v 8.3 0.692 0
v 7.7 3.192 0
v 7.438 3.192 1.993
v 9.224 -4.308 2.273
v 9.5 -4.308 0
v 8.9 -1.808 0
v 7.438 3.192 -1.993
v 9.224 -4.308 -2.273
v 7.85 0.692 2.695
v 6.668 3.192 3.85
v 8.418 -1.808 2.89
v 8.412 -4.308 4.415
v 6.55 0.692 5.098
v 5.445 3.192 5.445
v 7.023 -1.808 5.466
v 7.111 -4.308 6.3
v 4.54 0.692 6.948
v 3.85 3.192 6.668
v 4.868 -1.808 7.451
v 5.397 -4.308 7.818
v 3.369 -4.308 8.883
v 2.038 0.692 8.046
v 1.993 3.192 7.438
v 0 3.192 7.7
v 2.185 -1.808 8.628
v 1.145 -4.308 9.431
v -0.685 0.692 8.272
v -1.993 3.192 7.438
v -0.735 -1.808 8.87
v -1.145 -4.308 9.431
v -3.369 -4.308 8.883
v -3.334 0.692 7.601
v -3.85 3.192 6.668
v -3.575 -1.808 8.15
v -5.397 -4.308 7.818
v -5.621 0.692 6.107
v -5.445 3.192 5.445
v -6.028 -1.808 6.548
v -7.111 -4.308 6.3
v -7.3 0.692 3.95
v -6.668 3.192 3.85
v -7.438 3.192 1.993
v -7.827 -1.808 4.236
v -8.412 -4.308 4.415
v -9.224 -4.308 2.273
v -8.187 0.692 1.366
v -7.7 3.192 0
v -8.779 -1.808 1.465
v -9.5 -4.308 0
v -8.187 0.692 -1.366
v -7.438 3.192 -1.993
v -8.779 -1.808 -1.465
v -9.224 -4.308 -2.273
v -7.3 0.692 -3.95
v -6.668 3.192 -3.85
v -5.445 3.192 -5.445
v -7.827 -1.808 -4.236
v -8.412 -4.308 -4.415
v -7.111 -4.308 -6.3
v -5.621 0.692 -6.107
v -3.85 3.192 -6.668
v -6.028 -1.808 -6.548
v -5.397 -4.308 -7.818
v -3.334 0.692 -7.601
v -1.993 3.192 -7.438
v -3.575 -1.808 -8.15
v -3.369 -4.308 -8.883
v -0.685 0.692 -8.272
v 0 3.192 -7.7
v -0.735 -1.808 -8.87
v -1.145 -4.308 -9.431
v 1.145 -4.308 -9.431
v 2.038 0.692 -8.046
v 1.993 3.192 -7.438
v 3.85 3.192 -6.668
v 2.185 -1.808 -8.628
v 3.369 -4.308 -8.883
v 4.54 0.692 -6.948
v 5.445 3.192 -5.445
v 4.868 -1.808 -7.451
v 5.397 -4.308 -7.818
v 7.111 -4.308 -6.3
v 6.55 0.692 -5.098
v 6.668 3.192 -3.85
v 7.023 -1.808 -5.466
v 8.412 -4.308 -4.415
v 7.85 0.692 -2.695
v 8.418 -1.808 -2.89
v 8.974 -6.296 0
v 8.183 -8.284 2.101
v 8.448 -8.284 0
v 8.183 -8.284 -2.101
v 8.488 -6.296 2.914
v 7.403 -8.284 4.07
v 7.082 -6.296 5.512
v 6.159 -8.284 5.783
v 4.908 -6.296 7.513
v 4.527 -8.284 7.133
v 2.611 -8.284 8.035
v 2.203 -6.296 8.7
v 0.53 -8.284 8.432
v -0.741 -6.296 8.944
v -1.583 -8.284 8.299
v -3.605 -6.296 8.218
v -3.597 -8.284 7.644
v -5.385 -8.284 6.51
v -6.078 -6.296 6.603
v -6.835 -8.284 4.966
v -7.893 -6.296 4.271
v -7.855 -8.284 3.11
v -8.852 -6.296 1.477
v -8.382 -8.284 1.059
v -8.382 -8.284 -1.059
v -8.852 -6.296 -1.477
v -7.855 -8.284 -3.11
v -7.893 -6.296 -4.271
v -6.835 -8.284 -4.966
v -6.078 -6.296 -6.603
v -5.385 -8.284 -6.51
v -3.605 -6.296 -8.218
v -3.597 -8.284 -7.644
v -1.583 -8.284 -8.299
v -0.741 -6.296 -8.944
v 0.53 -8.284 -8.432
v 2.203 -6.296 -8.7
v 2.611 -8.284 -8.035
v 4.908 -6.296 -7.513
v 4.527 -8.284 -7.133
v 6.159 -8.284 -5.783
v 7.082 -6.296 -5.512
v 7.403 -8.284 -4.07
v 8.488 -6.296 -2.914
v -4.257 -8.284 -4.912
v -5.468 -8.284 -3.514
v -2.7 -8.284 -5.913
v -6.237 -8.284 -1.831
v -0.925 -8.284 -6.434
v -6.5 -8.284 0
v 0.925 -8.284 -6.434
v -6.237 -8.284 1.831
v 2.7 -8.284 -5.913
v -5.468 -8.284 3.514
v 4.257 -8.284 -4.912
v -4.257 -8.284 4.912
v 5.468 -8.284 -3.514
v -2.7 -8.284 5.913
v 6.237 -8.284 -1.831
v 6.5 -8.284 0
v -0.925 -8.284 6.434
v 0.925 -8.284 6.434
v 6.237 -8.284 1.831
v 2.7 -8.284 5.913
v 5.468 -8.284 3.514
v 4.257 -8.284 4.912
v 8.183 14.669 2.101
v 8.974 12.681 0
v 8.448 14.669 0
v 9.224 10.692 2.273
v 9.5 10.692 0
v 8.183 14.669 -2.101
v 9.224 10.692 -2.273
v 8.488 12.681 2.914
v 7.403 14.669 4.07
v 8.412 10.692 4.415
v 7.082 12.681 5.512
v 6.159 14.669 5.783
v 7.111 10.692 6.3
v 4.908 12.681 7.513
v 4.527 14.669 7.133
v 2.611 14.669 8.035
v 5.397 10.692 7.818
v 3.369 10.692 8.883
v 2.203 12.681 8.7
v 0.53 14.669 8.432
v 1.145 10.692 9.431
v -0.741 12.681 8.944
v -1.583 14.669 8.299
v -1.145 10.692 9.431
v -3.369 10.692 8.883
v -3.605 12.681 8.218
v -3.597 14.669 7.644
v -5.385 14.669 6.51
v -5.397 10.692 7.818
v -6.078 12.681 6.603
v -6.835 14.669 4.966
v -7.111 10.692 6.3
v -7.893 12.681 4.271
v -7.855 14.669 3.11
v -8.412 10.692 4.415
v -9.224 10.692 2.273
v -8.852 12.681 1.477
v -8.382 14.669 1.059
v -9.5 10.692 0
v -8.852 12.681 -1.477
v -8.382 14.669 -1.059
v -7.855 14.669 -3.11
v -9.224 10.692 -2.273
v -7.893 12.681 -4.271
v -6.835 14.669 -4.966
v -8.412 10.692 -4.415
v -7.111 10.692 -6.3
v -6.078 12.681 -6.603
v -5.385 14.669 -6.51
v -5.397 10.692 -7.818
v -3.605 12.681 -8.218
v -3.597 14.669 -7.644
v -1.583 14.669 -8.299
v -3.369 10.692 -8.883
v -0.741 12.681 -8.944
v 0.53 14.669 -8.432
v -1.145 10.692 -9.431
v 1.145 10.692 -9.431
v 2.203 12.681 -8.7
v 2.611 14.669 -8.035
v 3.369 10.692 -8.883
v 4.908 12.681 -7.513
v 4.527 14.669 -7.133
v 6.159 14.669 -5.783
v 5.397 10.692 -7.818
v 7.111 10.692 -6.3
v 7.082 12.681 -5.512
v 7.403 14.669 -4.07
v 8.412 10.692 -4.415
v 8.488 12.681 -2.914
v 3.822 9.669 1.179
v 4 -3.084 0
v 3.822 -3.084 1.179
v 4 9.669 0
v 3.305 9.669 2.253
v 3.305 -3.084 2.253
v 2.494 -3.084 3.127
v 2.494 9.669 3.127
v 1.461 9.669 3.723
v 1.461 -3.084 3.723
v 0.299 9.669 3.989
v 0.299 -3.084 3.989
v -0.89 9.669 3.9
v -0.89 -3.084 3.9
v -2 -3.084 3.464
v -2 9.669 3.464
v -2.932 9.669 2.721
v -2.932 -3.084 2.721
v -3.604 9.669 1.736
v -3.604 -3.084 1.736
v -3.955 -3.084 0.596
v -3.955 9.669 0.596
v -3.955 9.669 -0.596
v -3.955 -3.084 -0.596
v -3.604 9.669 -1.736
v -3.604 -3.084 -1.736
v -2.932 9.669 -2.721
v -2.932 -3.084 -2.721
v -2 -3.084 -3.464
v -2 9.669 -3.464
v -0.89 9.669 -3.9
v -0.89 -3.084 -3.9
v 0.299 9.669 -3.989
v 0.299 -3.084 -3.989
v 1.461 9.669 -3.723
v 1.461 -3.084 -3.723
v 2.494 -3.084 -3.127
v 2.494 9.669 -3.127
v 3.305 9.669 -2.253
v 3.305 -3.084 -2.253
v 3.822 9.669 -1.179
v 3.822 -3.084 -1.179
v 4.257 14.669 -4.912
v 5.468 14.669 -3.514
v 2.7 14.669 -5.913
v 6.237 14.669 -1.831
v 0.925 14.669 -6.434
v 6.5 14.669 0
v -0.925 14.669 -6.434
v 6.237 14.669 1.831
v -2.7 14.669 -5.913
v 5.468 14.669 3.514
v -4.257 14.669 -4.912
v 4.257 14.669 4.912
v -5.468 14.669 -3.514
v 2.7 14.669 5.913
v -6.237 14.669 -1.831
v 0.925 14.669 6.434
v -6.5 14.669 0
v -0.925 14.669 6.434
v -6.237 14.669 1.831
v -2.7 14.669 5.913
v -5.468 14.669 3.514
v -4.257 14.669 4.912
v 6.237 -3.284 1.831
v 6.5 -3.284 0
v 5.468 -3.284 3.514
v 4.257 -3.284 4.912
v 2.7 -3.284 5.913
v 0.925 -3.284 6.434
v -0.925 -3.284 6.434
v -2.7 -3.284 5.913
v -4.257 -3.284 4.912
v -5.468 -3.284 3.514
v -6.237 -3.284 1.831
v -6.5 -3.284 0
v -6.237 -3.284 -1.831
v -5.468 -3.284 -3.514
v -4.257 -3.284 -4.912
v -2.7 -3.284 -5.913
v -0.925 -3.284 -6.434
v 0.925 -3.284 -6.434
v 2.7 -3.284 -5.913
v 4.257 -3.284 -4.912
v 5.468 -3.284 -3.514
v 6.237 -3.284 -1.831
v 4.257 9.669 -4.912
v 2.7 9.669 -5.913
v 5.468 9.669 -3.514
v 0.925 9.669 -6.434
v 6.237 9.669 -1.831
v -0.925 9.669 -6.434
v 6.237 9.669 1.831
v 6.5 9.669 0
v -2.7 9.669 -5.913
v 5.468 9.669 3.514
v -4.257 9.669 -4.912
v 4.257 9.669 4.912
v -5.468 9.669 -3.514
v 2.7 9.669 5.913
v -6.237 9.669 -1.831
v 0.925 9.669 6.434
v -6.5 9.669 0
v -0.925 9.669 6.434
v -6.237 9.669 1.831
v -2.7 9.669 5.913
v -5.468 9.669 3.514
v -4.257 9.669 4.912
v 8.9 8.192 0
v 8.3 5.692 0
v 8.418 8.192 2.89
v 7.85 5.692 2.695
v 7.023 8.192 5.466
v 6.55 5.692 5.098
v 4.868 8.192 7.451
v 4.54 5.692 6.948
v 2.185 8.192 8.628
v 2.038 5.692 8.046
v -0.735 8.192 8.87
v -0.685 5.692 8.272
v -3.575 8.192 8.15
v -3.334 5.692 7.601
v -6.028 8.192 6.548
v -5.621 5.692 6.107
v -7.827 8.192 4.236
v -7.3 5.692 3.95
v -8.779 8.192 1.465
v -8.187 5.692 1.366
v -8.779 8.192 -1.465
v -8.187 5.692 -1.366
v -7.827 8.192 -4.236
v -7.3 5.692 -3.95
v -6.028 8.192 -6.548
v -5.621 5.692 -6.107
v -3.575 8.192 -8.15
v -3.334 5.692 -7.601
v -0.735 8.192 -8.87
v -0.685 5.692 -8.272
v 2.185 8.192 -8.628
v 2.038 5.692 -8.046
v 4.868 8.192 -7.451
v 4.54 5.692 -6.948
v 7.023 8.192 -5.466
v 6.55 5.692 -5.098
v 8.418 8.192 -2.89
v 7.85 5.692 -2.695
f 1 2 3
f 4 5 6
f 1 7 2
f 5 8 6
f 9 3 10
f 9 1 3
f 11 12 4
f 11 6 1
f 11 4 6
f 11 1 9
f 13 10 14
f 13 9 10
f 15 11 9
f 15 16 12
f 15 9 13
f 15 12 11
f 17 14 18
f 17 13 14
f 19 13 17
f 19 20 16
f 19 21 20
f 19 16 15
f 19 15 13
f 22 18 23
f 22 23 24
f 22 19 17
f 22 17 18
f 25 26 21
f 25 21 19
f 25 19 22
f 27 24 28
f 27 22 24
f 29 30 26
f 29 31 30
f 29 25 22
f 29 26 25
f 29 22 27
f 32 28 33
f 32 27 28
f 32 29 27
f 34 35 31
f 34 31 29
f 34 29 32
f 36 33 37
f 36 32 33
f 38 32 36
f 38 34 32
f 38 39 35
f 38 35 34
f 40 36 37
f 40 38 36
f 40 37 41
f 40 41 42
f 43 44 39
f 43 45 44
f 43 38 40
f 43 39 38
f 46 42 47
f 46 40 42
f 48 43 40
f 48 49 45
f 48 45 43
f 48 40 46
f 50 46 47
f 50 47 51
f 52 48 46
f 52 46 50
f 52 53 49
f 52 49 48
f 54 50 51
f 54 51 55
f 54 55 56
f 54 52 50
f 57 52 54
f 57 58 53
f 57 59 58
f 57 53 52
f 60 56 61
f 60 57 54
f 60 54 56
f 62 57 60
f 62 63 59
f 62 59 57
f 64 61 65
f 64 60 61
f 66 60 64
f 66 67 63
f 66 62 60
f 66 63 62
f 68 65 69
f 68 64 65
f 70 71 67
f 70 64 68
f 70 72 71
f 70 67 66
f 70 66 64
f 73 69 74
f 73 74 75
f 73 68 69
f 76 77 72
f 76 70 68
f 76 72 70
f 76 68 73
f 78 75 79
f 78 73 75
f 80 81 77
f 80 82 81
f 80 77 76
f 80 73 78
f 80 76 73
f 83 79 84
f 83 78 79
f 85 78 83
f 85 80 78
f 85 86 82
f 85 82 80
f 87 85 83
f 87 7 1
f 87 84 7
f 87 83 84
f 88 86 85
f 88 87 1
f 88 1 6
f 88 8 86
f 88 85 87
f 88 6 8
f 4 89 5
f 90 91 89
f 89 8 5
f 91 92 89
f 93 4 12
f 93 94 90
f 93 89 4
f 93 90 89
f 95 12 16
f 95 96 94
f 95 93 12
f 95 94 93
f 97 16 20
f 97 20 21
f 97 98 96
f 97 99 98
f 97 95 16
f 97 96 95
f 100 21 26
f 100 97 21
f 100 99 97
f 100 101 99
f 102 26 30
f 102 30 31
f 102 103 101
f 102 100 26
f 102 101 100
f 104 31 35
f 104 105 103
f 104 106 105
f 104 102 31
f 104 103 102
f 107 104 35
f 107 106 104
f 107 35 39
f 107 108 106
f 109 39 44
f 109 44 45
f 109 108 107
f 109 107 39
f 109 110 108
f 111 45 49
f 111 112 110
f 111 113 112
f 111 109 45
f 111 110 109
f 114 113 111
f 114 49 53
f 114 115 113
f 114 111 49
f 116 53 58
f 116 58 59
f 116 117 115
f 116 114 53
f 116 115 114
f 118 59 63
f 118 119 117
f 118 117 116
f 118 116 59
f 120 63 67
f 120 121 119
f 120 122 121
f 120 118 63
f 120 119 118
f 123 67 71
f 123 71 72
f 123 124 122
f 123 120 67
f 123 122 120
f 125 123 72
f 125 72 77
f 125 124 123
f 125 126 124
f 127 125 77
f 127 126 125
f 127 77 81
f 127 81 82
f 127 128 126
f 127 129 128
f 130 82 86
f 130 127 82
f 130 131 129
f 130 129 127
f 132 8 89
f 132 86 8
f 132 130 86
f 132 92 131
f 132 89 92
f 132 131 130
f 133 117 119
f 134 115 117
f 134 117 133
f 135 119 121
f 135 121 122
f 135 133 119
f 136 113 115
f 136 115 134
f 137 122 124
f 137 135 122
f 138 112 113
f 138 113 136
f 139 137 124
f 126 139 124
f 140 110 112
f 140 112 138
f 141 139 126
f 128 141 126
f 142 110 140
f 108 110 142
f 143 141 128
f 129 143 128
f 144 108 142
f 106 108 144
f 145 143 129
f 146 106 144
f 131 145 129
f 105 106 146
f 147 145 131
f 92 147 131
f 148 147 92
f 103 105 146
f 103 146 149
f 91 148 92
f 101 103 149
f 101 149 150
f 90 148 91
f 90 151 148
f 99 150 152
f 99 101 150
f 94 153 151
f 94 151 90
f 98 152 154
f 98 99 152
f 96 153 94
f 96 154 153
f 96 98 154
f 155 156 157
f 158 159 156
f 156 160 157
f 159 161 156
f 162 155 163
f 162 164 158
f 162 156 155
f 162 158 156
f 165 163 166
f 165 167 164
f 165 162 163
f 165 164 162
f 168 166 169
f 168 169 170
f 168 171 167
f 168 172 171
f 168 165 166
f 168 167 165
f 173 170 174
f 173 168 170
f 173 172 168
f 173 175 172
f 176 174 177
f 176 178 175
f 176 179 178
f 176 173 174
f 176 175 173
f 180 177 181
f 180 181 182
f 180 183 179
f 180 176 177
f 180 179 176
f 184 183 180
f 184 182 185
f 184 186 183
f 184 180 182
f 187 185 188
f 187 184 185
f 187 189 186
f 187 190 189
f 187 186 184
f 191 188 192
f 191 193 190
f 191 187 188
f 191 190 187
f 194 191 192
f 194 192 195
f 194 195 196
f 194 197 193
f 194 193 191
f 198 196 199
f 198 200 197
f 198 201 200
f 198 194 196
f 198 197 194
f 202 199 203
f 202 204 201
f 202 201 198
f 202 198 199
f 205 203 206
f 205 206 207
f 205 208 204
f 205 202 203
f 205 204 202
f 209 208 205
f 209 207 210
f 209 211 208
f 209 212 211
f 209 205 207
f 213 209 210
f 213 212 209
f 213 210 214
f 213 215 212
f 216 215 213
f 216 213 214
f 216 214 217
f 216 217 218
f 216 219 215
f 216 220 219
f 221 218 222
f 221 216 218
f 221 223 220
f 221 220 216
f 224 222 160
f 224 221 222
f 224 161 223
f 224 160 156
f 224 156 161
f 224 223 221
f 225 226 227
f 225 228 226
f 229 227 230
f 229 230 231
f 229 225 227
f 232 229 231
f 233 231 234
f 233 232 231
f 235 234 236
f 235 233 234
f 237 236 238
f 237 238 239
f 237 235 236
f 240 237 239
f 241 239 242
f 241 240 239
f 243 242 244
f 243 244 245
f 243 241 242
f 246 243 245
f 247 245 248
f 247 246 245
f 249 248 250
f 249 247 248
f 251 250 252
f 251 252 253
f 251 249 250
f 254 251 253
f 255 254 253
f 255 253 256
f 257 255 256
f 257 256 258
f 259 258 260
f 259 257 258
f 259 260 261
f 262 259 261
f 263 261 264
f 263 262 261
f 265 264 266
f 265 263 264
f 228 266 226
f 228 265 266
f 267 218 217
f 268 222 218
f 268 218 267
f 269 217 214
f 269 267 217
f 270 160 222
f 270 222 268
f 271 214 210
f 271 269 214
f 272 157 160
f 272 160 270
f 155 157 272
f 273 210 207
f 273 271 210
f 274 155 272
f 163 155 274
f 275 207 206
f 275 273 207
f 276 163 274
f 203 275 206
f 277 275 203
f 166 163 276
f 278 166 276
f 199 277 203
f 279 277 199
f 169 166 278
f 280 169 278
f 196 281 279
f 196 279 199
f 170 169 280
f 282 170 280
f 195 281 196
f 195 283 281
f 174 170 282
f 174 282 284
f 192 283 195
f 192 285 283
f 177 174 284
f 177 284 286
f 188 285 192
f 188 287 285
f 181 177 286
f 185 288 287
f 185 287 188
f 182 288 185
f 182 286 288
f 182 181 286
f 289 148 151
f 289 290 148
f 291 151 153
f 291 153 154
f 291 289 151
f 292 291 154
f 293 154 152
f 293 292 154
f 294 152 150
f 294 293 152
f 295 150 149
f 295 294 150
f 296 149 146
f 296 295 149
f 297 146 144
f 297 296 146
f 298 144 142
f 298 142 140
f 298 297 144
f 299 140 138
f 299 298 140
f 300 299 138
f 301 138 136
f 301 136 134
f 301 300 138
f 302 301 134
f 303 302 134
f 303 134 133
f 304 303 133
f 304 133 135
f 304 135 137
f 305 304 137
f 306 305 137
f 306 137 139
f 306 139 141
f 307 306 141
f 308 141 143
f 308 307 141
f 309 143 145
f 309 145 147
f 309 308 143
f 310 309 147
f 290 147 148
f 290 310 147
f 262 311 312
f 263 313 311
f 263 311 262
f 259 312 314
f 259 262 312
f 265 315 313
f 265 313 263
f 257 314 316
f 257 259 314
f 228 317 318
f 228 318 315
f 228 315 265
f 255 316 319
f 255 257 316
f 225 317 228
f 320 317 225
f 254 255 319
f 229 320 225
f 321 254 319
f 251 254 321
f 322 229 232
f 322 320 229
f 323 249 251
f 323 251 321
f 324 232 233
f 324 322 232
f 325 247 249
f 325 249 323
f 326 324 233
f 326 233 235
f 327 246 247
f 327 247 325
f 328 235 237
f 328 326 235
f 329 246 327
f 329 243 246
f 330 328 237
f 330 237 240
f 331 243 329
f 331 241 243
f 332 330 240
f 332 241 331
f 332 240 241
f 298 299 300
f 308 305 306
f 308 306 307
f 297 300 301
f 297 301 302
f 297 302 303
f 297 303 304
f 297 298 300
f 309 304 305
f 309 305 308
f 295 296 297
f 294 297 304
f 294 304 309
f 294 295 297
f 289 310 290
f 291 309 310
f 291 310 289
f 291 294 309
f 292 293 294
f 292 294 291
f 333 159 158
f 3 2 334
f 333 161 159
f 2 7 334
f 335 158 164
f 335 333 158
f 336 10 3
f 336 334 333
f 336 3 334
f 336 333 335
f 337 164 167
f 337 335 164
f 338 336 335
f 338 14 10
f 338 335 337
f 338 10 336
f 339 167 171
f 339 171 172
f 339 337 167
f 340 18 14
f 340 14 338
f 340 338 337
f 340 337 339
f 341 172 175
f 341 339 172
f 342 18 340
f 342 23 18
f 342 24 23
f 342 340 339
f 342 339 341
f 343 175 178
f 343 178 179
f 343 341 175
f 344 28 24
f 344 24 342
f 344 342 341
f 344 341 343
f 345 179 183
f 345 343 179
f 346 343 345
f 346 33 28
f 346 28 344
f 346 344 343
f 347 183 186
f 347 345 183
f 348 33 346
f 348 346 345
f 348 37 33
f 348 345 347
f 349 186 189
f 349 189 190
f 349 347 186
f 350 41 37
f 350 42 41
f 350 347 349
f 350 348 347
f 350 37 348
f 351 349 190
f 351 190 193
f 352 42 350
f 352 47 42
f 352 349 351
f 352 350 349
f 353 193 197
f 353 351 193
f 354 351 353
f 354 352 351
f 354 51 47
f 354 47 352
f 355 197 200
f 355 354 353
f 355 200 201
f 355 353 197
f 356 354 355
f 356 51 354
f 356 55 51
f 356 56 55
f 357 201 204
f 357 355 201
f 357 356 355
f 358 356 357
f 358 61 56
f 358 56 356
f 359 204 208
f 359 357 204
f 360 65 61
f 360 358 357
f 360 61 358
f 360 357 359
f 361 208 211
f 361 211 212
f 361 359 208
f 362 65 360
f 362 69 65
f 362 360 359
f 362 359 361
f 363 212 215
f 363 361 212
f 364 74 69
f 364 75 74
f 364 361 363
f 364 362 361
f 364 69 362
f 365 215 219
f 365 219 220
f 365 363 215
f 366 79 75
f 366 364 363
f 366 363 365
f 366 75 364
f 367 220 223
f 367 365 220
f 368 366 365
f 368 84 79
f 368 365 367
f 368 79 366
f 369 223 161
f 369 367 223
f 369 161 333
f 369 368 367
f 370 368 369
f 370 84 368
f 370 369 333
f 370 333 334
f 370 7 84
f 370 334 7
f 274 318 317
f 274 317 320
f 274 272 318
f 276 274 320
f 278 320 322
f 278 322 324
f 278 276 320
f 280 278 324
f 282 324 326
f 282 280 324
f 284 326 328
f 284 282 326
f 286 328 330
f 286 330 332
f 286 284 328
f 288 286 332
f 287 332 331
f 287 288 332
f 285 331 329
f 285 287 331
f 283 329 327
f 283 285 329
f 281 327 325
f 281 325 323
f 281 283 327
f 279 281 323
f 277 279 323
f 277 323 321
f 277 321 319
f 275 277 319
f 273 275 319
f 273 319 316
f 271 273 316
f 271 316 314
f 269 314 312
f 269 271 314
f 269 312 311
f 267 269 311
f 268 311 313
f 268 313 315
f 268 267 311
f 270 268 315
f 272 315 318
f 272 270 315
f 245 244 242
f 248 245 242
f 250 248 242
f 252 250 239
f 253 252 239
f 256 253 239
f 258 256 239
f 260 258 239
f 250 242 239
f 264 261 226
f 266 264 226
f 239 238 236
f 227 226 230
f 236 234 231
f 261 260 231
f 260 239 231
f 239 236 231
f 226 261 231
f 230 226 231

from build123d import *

# Parameters (mm, degrees)
SKETCH2_R           = 4
BOSS_EXTRUDE1_DEPTH = 0.2


with BuildPart() as part:
    # Sketch1 → Revolve1 (revolve)
    with BuildSketch(Plane.XY):
        Polygon((4, -3.284366974), (4, 9.669000537), (6.5, 9.669000537), (6.5, 14.669000537), (8.448345124, 14.669000537), (9.5, 10.692316782), (7.7, 3.192316782), (9.5, -4.307683218), (8.448345124, -8.284366974), (6.5, -8.284366974), (6.5, -3.284366974), align=None)
    revolve(axis=Axis((0, 42.323455848, 0), (0, -1, 0)))

    # Sketch2 → Boss-Extrude1 (add)
    with BuildSketch(Plane.XZ.offset(3.284366974)):
        Circle(SKETCH2_R)
    extrude(amount=-BOSS_EXTRUDE1_DEPTH)


solid = part.part
